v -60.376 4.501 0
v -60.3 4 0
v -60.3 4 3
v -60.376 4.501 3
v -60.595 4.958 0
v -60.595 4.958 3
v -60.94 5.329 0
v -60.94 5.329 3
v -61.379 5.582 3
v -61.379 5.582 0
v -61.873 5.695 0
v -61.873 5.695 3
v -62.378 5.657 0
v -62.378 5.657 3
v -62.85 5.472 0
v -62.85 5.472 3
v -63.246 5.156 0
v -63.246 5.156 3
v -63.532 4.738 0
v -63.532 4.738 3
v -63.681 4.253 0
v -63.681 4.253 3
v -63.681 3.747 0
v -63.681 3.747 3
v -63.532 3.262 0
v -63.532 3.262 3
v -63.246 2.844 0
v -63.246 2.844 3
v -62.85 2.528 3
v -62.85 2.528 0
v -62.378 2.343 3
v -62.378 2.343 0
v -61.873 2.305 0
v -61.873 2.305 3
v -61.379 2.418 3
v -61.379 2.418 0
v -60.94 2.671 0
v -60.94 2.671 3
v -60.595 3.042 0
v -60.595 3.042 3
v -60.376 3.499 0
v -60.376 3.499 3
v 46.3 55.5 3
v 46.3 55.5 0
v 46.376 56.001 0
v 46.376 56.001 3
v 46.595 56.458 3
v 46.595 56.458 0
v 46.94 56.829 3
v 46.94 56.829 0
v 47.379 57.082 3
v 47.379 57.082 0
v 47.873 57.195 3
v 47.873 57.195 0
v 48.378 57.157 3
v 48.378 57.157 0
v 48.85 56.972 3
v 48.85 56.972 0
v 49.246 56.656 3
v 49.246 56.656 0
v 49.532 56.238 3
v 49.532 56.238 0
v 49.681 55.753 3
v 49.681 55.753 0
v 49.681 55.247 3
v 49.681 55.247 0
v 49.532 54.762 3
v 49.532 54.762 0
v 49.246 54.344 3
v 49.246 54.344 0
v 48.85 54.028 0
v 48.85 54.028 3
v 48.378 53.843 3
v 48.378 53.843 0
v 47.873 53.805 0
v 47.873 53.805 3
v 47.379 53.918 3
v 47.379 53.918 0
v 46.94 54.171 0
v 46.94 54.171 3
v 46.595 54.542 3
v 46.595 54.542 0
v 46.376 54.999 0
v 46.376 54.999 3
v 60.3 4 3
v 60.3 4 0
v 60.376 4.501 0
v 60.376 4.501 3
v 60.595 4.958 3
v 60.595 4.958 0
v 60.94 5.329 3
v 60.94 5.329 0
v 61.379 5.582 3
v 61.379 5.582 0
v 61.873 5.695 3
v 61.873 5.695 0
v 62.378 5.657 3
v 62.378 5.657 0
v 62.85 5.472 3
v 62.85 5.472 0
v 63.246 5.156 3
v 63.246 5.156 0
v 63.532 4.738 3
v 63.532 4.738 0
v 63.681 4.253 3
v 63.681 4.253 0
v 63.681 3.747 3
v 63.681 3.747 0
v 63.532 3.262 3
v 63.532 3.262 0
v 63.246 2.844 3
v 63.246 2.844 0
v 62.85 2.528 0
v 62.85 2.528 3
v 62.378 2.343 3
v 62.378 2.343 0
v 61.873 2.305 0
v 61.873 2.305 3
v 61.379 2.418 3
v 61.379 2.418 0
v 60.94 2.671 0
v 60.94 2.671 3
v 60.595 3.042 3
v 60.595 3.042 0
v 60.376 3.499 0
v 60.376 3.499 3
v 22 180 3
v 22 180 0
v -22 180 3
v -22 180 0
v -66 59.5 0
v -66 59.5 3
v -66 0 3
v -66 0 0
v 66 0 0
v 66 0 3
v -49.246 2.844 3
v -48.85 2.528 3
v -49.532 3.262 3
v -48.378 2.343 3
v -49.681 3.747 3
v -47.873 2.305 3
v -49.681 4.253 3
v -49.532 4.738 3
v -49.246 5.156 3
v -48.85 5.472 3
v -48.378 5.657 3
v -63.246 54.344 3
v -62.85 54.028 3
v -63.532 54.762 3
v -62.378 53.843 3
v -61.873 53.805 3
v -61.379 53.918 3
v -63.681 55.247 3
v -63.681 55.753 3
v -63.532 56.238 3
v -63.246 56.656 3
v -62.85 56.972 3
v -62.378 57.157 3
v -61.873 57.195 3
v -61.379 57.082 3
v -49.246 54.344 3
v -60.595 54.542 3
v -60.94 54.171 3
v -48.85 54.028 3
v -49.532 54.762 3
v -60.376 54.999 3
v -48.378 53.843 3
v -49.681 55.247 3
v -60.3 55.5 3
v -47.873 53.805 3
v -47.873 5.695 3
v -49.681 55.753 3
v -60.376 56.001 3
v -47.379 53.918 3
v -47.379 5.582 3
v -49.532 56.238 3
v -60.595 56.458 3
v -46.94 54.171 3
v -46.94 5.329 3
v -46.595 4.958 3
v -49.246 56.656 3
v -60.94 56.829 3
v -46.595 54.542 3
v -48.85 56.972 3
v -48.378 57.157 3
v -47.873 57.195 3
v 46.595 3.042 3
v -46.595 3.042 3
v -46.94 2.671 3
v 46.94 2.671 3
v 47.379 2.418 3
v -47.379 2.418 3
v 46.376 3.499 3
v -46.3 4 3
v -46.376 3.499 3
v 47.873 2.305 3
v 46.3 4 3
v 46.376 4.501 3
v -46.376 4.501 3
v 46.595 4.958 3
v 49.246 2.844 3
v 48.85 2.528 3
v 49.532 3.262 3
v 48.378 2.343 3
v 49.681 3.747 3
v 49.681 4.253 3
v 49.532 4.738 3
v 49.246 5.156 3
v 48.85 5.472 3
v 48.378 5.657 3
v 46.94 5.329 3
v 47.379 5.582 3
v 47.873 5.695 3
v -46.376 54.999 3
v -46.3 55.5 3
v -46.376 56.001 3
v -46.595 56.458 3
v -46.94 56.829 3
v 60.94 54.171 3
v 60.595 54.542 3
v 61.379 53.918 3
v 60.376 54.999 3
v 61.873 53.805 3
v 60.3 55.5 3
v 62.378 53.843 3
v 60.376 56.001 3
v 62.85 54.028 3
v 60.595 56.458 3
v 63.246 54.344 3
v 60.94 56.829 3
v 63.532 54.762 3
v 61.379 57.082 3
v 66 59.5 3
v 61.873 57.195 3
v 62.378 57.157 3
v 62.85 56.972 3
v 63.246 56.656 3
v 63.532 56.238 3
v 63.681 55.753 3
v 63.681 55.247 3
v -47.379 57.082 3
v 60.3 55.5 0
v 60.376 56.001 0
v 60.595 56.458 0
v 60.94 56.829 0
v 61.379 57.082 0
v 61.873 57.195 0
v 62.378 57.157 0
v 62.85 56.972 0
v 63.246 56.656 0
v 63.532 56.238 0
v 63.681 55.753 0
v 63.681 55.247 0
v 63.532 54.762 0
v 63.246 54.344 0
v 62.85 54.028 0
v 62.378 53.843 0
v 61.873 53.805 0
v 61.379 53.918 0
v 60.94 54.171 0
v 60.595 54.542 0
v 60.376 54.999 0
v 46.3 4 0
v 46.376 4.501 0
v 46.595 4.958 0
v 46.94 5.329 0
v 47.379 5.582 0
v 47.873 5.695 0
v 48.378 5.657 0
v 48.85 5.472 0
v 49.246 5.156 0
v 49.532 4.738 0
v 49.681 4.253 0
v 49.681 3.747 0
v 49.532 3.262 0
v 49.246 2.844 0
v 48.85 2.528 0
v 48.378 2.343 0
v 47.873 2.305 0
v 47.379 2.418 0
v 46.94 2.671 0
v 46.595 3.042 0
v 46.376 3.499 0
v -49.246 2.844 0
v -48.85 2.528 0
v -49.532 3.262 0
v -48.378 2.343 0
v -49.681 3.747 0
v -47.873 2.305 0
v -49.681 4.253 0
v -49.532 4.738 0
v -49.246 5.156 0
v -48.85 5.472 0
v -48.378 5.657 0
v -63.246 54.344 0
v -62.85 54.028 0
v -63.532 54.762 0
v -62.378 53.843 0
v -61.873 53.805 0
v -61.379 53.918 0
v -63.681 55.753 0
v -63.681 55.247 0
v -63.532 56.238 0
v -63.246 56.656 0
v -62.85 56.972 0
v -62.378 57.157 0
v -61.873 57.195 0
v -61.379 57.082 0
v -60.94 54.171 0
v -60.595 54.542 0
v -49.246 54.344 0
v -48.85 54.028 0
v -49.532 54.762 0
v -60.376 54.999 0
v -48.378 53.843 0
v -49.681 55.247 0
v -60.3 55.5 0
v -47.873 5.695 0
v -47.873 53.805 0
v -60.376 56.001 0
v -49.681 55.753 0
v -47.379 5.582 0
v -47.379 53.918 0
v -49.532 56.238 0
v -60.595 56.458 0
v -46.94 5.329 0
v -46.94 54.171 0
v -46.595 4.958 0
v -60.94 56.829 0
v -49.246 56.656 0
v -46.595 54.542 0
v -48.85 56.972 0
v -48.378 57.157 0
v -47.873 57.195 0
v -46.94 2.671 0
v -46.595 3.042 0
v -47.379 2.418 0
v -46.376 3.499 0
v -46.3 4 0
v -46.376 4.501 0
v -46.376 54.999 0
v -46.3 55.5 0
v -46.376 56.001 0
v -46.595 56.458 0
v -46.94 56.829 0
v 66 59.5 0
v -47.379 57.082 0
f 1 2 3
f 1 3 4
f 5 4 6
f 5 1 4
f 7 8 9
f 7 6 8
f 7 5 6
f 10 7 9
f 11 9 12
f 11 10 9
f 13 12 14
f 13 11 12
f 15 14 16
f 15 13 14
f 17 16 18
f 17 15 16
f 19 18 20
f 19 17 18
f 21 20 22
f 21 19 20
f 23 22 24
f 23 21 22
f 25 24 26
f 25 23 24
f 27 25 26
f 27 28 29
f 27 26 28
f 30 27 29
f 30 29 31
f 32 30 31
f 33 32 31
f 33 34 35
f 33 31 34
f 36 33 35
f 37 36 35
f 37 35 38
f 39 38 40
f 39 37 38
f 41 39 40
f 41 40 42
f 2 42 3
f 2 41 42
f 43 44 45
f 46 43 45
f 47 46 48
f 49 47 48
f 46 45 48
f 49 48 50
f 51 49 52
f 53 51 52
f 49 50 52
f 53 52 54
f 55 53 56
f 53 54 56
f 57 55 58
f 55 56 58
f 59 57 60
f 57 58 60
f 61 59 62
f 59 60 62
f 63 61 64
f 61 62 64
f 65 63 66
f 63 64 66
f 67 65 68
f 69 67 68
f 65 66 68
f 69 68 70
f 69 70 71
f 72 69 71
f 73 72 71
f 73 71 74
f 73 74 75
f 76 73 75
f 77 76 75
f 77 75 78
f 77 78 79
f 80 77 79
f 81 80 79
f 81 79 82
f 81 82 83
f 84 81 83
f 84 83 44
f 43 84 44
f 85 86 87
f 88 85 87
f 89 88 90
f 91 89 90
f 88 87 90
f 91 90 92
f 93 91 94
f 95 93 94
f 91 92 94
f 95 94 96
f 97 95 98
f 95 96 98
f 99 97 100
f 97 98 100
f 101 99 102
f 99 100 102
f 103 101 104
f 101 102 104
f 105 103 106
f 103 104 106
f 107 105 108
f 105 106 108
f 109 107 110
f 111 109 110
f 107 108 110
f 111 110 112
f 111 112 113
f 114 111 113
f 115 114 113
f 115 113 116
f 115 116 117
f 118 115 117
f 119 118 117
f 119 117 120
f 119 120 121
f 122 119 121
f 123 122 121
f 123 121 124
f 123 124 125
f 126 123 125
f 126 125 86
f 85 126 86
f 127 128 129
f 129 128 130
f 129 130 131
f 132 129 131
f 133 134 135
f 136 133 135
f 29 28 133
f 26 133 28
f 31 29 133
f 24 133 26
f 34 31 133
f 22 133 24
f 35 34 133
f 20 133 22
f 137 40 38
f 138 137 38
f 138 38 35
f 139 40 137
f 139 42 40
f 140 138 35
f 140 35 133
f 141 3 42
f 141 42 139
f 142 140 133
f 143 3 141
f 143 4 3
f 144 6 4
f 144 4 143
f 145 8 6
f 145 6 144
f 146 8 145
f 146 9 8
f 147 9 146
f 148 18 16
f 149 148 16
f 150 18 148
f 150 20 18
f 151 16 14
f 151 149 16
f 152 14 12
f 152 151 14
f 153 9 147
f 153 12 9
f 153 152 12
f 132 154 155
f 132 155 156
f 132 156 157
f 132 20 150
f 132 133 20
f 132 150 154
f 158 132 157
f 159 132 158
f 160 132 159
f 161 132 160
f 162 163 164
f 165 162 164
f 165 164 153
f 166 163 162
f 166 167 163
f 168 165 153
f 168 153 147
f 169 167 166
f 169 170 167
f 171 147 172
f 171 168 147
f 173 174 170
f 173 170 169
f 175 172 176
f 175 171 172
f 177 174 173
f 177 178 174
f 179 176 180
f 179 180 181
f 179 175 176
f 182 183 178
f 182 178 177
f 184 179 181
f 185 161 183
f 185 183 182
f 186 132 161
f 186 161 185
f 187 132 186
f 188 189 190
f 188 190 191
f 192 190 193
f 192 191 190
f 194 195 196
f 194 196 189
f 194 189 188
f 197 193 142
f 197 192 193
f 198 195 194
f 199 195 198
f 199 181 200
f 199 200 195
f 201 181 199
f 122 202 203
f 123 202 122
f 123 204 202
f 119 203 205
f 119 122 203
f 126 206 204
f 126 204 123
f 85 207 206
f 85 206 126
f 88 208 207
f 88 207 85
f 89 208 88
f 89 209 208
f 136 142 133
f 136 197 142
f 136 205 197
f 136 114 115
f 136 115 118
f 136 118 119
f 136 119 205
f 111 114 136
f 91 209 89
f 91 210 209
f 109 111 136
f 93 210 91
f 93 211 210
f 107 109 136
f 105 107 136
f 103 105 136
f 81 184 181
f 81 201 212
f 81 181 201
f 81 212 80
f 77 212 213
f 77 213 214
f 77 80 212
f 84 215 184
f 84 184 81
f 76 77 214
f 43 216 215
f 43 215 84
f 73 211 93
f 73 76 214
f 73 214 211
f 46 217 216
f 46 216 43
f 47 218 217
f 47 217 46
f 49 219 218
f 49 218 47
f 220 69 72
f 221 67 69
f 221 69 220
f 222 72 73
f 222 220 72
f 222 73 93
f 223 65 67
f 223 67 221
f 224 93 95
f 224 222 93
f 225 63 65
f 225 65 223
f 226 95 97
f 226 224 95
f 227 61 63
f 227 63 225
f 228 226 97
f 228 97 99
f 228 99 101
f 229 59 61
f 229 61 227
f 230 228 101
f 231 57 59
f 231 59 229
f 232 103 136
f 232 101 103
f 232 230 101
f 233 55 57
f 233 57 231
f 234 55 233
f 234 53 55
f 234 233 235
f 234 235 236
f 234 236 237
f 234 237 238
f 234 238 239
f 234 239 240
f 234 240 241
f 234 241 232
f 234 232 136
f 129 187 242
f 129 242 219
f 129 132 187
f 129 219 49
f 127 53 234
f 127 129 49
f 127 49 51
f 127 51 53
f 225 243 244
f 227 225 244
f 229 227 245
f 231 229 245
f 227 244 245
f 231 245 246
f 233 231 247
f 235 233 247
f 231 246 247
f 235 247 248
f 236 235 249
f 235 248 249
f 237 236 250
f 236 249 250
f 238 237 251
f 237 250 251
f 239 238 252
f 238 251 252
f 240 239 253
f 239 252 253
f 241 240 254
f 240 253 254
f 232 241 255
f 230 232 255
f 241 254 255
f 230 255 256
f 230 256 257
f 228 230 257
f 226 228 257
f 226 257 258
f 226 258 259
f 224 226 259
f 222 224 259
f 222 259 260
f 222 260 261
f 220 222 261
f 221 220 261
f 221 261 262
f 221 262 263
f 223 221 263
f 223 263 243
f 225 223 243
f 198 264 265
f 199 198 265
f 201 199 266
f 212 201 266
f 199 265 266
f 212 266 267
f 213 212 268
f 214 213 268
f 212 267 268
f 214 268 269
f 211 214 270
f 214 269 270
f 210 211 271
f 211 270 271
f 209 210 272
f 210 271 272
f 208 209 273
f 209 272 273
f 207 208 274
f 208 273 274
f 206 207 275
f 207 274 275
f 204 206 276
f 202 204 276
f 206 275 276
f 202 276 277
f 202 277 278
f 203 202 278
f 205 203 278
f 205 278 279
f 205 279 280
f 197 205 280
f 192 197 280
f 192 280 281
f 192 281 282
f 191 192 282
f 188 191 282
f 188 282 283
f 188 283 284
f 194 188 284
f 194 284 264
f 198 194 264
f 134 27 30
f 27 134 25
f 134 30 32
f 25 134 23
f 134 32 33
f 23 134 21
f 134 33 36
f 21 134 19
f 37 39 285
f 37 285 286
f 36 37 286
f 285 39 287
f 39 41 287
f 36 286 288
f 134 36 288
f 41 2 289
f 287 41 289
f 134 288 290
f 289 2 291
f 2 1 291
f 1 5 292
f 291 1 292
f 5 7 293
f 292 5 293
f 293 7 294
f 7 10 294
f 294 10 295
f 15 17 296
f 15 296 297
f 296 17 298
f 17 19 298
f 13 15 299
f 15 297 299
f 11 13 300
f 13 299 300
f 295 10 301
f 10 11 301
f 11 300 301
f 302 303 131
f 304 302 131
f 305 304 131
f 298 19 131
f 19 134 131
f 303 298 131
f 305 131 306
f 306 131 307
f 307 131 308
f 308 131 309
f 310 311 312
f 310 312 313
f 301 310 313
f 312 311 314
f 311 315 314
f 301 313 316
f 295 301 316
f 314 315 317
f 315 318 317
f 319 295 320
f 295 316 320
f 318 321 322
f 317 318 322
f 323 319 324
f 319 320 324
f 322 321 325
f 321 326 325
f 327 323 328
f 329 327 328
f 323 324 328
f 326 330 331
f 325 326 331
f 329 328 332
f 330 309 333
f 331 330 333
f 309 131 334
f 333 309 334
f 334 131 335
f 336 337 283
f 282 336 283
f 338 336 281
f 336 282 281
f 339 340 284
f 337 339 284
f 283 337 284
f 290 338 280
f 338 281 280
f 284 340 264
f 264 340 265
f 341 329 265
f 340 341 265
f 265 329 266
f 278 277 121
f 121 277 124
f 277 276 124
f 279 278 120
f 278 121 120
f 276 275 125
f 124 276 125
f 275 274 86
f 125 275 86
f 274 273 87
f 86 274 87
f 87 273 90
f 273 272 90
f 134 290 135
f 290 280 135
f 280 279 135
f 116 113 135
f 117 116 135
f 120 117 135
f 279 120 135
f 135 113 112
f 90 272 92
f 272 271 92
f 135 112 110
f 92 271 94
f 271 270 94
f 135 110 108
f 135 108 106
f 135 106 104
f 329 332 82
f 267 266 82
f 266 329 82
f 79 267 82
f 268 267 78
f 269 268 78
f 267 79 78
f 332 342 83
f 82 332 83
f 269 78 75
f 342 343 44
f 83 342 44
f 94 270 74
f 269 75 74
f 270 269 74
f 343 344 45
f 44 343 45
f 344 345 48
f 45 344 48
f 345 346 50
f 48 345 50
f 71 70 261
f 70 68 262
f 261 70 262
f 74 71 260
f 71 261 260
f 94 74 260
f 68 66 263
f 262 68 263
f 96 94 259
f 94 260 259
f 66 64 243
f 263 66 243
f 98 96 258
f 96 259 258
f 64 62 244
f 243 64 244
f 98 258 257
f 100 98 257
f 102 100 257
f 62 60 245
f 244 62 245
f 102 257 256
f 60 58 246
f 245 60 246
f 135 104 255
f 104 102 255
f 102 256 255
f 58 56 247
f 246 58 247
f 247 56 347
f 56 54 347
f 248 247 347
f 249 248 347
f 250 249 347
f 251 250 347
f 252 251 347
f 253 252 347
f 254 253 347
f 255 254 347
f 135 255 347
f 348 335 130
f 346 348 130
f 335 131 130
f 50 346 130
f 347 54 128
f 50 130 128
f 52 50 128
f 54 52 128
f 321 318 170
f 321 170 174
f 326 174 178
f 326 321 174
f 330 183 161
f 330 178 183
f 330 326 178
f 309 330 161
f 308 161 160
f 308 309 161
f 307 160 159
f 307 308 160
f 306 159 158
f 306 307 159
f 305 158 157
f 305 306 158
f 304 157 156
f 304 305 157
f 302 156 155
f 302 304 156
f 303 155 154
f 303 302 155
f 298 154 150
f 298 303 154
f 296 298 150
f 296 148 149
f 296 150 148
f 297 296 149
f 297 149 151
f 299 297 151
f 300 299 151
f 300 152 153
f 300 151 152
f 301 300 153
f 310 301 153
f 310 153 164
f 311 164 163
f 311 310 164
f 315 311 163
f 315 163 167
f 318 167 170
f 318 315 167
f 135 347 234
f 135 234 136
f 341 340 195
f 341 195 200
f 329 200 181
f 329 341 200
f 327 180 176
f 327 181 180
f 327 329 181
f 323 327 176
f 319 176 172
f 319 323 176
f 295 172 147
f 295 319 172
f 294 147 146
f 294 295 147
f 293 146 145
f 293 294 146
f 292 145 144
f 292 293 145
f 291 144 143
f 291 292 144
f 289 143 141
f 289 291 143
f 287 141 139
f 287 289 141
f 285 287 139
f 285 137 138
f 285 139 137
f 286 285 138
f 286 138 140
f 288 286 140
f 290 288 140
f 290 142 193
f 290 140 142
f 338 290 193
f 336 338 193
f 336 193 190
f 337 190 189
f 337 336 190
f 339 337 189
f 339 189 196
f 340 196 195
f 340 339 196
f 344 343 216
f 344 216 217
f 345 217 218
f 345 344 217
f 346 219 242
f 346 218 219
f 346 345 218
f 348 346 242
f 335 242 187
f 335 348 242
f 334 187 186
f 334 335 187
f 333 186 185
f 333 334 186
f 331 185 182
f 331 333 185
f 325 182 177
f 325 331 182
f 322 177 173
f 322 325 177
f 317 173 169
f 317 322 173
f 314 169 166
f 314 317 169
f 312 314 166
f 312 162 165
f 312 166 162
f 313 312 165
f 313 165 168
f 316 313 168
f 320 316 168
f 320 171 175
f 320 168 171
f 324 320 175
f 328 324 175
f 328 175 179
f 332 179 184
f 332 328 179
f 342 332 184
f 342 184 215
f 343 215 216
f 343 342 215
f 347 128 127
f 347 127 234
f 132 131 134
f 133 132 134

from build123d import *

# Parameters (mm, degrees)
BOSS_EXTRUDE1_DEPTH  = 3
M3_CLEARANCE_HOLE1_D = 3.4


with BuildPart() as part:
    # Sketch1 → Boss-Extrude1 (new body)
    with BuildSketch(Plane.XY):
        Polygon((0, 180), (22, 180), (66, 59.5), (66, 0), (0, 0), align=None)
    boss_extrude1 = extrude(amount=BOSS_EXTRUDE1_DEPTH)

    # M3 Clearance Hole1 (through all)
    with Locations(Plane.XY.offset(3)):
        with Locations((48, 55.5), (62, 55.5), (48, 4), (62, 4)):
            m3_clearance_hole1 = Hole(M3_CLEARANCE_HOLE1_D / 2)

    # Mirror1: Boss-Extrude1, M3 Clearance Hole1 across plane
    add(boss_extrude1.mirror(Plane(origin=(0, 180, 3), x_dir=(0, 0, 1), z_dir=(1, 0, 0))))
    add(m3_clearance_hole1.mirror(Plane(origin=(0, 180, 3), x_dir=(0, 0, 1), z_dir=(1, 0, 0))), mode=Mode.SUBTRACT)


solid = part.part
